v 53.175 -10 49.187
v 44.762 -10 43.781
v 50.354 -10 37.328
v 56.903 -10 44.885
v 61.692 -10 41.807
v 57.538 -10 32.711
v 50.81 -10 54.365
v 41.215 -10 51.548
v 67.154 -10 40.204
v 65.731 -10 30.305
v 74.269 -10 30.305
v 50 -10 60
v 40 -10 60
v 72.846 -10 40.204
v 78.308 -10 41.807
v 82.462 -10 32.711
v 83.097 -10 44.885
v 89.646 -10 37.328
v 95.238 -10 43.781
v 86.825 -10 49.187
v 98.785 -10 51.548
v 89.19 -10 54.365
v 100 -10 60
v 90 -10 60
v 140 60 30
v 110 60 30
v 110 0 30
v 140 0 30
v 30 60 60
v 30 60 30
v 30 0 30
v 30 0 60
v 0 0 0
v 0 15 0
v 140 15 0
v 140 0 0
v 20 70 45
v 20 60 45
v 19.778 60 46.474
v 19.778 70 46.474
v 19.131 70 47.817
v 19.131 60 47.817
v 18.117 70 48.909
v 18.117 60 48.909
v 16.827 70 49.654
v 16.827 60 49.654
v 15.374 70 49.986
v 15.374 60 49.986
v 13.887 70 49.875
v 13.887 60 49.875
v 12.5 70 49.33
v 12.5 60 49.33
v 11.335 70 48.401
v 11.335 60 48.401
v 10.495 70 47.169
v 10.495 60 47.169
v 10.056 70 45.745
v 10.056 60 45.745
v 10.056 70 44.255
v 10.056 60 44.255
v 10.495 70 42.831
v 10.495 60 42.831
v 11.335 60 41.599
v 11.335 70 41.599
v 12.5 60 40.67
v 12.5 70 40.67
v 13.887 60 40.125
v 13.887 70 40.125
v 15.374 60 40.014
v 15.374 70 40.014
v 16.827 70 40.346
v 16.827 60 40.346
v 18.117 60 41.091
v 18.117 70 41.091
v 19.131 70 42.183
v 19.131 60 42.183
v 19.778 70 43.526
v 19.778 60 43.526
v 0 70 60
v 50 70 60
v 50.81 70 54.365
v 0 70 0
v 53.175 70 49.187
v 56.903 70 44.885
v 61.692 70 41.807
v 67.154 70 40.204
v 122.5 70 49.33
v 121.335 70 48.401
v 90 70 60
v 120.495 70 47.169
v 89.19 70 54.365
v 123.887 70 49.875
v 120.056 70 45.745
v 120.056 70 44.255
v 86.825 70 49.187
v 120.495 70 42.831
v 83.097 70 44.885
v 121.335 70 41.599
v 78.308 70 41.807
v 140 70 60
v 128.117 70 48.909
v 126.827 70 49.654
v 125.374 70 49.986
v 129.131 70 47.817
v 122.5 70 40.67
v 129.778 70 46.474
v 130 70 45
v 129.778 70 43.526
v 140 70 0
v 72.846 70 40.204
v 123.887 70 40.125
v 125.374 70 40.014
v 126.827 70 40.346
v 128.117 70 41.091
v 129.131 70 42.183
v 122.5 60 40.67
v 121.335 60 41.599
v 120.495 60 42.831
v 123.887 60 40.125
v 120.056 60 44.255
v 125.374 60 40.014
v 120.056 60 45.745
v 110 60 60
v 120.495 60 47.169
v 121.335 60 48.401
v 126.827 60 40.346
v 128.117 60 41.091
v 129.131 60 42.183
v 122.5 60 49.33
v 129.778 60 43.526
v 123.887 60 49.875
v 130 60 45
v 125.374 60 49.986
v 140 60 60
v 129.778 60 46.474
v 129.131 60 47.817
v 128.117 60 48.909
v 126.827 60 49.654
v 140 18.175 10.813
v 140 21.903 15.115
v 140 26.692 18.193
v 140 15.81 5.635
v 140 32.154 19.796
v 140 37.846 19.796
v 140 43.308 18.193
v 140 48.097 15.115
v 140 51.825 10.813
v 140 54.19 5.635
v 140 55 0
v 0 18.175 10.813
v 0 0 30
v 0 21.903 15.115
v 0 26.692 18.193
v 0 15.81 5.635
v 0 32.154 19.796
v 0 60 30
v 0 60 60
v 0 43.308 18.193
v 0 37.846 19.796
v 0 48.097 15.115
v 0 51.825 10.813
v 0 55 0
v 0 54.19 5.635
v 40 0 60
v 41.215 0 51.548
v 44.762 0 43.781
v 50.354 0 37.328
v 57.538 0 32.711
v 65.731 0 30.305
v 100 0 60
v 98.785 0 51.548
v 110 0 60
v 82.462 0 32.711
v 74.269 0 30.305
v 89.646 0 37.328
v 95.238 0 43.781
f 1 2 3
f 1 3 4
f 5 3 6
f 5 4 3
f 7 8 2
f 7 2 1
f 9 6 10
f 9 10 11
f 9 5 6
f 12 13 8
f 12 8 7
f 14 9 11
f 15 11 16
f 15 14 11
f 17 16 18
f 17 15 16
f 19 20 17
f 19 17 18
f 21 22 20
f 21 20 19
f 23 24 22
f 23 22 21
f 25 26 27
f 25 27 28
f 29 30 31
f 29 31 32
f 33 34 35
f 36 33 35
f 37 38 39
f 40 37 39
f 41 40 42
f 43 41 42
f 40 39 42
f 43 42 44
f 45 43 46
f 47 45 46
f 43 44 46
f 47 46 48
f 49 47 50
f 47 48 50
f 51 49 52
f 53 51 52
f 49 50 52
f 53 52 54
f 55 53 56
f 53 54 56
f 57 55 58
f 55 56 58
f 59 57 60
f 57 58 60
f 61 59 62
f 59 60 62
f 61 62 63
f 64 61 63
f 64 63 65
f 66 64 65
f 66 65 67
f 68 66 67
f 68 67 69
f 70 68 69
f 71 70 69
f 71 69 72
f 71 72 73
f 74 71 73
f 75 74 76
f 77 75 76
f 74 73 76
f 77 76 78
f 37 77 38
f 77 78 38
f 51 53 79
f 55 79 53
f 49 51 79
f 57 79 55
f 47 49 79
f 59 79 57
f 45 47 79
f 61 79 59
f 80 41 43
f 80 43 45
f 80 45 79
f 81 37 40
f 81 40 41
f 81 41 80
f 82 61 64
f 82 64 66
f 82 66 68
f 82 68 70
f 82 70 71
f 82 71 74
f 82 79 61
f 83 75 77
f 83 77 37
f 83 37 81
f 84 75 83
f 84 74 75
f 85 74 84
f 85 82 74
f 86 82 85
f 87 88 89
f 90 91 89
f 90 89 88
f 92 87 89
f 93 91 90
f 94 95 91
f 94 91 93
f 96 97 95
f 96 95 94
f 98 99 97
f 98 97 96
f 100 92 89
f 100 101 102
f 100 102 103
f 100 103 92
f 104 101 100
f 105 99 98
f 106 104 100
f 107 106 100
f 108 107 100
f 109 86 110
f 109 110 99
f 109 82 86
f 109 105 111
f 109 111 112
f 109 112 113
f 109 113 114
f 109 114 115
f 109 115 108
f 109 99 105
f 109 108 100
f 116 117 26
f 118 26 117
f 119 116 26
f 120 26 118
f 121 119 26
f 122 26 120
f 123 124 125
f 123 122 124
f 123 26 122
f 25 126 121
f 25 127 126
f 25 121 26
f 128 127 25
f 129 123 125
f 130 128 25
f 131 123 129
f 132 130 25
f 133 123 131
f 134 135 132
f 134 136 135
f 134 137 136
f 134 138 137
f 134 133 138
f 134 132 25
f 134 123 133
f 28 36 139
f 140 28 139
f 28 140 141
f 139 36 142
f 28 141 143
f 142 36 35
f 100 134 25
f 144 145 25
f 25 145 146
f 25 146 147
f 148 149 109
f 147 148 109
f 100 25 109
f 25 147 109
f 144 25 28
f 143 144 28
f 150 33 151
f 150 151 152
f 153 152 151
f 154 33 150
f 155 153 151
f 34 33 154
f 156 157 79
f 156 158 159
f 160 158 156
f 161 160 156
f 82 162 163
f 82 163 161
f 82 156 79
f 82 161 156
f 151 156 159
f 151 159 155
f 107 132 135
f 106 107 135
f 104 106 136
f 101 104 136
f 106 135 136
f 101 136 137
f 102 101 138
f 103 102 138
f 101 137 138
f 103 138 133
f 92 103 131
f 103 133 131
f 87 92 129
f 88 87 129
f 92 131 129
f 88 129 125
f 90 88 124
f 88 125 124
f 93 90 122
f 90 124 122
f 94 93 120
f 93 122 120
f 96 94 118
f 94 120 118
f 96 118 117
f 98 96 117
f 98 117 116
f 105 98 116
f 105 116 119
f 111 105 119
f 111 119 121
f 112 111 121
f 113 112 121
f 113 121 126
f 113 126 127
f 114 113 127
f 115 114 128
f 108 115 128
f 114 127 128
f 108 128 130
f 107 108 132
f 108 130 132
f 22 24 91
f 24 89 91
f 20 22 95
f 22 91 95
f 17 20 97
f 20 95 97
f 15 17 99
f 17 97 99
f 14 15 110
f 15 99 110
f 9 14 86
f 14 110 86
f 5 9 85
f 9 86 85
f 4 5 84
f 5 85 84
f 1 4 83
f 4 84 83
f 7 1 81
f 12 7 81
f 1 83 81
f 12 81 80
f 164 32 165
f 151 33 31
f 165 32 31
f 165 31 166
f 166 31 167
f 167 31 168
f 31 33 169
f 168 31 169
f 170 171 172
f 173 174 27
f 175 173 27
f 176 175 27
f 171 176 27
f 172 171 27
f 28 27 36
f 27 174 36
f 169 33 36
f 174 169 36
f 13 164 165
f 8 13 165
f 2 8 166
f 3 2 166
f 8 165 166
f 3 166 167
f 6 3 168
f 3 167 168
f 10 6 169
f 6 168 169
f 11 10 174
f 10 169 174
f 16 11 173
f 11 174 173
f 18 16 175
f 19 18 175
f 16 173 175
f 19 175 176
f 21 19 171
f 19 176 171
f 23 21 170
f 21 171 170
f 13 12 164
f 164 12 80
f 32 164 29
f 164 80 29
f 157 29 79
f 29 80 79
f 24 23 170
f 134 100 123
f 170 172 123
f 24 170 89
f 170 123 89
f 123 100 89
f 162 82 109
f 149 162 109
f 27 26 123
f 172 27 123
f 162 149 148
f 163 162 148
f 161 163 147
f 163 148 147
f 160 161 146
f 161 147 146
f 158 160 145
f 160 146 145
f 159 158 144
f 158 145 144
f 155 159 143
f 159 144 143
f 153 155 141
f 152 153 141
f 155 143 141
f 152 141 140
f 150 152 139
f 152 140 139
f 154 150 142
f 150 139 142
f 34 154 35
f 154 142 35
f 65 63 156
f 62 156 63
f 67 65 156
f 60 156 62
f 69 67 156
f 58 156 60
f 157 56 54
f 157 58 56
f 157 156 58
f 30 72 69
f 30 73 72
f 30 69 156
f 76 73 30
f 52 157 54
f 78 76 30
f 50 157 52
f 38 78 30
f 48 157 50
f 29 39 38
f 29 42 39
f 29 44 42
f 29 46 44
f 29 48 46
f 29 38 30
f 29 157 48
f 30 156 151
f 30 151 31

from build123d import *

# Parameters (mm, degrees)
F0_W      = 140
F0_H      = 70
F1_DEPTH  = 60
F2_W      = 30
F2_H      = 30
F3_DEPTH  = 60
F4_DEPTH  = 60
F5_R      = 5
F6_DEPTH  = 10
F8_DEPTH  = 70
F10_DEPTH = 140
F11_DEPTH = 10


with BuildPart() as f1:
    # F0 (on Top) → F1 (new body)
    with BuildSketch(Plane.XY):
        with Locations((70, 35)):
            Rectangle(F0_W, F0_H)
    extrude(amount=F1_DEPTH)

    # F2 (on face) → F3 (cut)
    with BuildSketch(Plane.XZ):
        with Locations((15, 45)):
            Rectangle(F2_W, F2_H)
    extrude(amount=-F3_DEPTH, mode=Mode.SUBTRACT)

    # F2 (on face) → F4 (cut)
    with BuildSketch(Plane.XZ):
        with Locations((125, 45)):
            Rectangle(F2_W, F2_H)
    extrude(amount=-F4_DEPTH, mode=Mode.SUBTRACT)

    # F5 (on face) → F6 (cut, through all)
    with BuildSketch(Plane.XZ.offset(-60)):
        with Locations((15, 45)):
            Circle(F5_R)
        with Locations((125, 45)):
            Circle(F5_R)
    extrude(amount=-F6_DEPTH, mode=Mode.SUBTRACT)

    # F7 (on face) → F8 (cut, through all)
    with BuildSketch(Plane.XZ):
        with BuildLine():
            ThreePointArc((50, 60), (70, 40), (90, 60))
            Line((90, 60), (50, 60))
        make_face()
    extrude(amount=-F8_DEPTH, mode=Mode.SUBTRACT)

    # F9 (on face) → F10 (cut, through all)
    with BuildSketch(Plane.YZ.offset(140)):
        with BuildLine():
            Line((15, 0), (55, 0))
            ThreePointArc((55, 0), (35, 20), (15, 0))
        make_face()
    extrude(amount=-F10_DEPTH, mode=Mode.SUBTRACT)

    # F7 (on face) → F11 (join)
    with BuildSketch(Plane.XZ):
        with BuildLine():
            Line((100, 60), (90, 60))
            ThreePointArc((90, 60), (70, 40), (50, 60))
            Line((50, 60), (40, 60))
            ThreePointArc((40, 60), (70, 30), (100, 60))
        make_face()
    extrude(amount=F11_DEPTH)


solid = f1.part
